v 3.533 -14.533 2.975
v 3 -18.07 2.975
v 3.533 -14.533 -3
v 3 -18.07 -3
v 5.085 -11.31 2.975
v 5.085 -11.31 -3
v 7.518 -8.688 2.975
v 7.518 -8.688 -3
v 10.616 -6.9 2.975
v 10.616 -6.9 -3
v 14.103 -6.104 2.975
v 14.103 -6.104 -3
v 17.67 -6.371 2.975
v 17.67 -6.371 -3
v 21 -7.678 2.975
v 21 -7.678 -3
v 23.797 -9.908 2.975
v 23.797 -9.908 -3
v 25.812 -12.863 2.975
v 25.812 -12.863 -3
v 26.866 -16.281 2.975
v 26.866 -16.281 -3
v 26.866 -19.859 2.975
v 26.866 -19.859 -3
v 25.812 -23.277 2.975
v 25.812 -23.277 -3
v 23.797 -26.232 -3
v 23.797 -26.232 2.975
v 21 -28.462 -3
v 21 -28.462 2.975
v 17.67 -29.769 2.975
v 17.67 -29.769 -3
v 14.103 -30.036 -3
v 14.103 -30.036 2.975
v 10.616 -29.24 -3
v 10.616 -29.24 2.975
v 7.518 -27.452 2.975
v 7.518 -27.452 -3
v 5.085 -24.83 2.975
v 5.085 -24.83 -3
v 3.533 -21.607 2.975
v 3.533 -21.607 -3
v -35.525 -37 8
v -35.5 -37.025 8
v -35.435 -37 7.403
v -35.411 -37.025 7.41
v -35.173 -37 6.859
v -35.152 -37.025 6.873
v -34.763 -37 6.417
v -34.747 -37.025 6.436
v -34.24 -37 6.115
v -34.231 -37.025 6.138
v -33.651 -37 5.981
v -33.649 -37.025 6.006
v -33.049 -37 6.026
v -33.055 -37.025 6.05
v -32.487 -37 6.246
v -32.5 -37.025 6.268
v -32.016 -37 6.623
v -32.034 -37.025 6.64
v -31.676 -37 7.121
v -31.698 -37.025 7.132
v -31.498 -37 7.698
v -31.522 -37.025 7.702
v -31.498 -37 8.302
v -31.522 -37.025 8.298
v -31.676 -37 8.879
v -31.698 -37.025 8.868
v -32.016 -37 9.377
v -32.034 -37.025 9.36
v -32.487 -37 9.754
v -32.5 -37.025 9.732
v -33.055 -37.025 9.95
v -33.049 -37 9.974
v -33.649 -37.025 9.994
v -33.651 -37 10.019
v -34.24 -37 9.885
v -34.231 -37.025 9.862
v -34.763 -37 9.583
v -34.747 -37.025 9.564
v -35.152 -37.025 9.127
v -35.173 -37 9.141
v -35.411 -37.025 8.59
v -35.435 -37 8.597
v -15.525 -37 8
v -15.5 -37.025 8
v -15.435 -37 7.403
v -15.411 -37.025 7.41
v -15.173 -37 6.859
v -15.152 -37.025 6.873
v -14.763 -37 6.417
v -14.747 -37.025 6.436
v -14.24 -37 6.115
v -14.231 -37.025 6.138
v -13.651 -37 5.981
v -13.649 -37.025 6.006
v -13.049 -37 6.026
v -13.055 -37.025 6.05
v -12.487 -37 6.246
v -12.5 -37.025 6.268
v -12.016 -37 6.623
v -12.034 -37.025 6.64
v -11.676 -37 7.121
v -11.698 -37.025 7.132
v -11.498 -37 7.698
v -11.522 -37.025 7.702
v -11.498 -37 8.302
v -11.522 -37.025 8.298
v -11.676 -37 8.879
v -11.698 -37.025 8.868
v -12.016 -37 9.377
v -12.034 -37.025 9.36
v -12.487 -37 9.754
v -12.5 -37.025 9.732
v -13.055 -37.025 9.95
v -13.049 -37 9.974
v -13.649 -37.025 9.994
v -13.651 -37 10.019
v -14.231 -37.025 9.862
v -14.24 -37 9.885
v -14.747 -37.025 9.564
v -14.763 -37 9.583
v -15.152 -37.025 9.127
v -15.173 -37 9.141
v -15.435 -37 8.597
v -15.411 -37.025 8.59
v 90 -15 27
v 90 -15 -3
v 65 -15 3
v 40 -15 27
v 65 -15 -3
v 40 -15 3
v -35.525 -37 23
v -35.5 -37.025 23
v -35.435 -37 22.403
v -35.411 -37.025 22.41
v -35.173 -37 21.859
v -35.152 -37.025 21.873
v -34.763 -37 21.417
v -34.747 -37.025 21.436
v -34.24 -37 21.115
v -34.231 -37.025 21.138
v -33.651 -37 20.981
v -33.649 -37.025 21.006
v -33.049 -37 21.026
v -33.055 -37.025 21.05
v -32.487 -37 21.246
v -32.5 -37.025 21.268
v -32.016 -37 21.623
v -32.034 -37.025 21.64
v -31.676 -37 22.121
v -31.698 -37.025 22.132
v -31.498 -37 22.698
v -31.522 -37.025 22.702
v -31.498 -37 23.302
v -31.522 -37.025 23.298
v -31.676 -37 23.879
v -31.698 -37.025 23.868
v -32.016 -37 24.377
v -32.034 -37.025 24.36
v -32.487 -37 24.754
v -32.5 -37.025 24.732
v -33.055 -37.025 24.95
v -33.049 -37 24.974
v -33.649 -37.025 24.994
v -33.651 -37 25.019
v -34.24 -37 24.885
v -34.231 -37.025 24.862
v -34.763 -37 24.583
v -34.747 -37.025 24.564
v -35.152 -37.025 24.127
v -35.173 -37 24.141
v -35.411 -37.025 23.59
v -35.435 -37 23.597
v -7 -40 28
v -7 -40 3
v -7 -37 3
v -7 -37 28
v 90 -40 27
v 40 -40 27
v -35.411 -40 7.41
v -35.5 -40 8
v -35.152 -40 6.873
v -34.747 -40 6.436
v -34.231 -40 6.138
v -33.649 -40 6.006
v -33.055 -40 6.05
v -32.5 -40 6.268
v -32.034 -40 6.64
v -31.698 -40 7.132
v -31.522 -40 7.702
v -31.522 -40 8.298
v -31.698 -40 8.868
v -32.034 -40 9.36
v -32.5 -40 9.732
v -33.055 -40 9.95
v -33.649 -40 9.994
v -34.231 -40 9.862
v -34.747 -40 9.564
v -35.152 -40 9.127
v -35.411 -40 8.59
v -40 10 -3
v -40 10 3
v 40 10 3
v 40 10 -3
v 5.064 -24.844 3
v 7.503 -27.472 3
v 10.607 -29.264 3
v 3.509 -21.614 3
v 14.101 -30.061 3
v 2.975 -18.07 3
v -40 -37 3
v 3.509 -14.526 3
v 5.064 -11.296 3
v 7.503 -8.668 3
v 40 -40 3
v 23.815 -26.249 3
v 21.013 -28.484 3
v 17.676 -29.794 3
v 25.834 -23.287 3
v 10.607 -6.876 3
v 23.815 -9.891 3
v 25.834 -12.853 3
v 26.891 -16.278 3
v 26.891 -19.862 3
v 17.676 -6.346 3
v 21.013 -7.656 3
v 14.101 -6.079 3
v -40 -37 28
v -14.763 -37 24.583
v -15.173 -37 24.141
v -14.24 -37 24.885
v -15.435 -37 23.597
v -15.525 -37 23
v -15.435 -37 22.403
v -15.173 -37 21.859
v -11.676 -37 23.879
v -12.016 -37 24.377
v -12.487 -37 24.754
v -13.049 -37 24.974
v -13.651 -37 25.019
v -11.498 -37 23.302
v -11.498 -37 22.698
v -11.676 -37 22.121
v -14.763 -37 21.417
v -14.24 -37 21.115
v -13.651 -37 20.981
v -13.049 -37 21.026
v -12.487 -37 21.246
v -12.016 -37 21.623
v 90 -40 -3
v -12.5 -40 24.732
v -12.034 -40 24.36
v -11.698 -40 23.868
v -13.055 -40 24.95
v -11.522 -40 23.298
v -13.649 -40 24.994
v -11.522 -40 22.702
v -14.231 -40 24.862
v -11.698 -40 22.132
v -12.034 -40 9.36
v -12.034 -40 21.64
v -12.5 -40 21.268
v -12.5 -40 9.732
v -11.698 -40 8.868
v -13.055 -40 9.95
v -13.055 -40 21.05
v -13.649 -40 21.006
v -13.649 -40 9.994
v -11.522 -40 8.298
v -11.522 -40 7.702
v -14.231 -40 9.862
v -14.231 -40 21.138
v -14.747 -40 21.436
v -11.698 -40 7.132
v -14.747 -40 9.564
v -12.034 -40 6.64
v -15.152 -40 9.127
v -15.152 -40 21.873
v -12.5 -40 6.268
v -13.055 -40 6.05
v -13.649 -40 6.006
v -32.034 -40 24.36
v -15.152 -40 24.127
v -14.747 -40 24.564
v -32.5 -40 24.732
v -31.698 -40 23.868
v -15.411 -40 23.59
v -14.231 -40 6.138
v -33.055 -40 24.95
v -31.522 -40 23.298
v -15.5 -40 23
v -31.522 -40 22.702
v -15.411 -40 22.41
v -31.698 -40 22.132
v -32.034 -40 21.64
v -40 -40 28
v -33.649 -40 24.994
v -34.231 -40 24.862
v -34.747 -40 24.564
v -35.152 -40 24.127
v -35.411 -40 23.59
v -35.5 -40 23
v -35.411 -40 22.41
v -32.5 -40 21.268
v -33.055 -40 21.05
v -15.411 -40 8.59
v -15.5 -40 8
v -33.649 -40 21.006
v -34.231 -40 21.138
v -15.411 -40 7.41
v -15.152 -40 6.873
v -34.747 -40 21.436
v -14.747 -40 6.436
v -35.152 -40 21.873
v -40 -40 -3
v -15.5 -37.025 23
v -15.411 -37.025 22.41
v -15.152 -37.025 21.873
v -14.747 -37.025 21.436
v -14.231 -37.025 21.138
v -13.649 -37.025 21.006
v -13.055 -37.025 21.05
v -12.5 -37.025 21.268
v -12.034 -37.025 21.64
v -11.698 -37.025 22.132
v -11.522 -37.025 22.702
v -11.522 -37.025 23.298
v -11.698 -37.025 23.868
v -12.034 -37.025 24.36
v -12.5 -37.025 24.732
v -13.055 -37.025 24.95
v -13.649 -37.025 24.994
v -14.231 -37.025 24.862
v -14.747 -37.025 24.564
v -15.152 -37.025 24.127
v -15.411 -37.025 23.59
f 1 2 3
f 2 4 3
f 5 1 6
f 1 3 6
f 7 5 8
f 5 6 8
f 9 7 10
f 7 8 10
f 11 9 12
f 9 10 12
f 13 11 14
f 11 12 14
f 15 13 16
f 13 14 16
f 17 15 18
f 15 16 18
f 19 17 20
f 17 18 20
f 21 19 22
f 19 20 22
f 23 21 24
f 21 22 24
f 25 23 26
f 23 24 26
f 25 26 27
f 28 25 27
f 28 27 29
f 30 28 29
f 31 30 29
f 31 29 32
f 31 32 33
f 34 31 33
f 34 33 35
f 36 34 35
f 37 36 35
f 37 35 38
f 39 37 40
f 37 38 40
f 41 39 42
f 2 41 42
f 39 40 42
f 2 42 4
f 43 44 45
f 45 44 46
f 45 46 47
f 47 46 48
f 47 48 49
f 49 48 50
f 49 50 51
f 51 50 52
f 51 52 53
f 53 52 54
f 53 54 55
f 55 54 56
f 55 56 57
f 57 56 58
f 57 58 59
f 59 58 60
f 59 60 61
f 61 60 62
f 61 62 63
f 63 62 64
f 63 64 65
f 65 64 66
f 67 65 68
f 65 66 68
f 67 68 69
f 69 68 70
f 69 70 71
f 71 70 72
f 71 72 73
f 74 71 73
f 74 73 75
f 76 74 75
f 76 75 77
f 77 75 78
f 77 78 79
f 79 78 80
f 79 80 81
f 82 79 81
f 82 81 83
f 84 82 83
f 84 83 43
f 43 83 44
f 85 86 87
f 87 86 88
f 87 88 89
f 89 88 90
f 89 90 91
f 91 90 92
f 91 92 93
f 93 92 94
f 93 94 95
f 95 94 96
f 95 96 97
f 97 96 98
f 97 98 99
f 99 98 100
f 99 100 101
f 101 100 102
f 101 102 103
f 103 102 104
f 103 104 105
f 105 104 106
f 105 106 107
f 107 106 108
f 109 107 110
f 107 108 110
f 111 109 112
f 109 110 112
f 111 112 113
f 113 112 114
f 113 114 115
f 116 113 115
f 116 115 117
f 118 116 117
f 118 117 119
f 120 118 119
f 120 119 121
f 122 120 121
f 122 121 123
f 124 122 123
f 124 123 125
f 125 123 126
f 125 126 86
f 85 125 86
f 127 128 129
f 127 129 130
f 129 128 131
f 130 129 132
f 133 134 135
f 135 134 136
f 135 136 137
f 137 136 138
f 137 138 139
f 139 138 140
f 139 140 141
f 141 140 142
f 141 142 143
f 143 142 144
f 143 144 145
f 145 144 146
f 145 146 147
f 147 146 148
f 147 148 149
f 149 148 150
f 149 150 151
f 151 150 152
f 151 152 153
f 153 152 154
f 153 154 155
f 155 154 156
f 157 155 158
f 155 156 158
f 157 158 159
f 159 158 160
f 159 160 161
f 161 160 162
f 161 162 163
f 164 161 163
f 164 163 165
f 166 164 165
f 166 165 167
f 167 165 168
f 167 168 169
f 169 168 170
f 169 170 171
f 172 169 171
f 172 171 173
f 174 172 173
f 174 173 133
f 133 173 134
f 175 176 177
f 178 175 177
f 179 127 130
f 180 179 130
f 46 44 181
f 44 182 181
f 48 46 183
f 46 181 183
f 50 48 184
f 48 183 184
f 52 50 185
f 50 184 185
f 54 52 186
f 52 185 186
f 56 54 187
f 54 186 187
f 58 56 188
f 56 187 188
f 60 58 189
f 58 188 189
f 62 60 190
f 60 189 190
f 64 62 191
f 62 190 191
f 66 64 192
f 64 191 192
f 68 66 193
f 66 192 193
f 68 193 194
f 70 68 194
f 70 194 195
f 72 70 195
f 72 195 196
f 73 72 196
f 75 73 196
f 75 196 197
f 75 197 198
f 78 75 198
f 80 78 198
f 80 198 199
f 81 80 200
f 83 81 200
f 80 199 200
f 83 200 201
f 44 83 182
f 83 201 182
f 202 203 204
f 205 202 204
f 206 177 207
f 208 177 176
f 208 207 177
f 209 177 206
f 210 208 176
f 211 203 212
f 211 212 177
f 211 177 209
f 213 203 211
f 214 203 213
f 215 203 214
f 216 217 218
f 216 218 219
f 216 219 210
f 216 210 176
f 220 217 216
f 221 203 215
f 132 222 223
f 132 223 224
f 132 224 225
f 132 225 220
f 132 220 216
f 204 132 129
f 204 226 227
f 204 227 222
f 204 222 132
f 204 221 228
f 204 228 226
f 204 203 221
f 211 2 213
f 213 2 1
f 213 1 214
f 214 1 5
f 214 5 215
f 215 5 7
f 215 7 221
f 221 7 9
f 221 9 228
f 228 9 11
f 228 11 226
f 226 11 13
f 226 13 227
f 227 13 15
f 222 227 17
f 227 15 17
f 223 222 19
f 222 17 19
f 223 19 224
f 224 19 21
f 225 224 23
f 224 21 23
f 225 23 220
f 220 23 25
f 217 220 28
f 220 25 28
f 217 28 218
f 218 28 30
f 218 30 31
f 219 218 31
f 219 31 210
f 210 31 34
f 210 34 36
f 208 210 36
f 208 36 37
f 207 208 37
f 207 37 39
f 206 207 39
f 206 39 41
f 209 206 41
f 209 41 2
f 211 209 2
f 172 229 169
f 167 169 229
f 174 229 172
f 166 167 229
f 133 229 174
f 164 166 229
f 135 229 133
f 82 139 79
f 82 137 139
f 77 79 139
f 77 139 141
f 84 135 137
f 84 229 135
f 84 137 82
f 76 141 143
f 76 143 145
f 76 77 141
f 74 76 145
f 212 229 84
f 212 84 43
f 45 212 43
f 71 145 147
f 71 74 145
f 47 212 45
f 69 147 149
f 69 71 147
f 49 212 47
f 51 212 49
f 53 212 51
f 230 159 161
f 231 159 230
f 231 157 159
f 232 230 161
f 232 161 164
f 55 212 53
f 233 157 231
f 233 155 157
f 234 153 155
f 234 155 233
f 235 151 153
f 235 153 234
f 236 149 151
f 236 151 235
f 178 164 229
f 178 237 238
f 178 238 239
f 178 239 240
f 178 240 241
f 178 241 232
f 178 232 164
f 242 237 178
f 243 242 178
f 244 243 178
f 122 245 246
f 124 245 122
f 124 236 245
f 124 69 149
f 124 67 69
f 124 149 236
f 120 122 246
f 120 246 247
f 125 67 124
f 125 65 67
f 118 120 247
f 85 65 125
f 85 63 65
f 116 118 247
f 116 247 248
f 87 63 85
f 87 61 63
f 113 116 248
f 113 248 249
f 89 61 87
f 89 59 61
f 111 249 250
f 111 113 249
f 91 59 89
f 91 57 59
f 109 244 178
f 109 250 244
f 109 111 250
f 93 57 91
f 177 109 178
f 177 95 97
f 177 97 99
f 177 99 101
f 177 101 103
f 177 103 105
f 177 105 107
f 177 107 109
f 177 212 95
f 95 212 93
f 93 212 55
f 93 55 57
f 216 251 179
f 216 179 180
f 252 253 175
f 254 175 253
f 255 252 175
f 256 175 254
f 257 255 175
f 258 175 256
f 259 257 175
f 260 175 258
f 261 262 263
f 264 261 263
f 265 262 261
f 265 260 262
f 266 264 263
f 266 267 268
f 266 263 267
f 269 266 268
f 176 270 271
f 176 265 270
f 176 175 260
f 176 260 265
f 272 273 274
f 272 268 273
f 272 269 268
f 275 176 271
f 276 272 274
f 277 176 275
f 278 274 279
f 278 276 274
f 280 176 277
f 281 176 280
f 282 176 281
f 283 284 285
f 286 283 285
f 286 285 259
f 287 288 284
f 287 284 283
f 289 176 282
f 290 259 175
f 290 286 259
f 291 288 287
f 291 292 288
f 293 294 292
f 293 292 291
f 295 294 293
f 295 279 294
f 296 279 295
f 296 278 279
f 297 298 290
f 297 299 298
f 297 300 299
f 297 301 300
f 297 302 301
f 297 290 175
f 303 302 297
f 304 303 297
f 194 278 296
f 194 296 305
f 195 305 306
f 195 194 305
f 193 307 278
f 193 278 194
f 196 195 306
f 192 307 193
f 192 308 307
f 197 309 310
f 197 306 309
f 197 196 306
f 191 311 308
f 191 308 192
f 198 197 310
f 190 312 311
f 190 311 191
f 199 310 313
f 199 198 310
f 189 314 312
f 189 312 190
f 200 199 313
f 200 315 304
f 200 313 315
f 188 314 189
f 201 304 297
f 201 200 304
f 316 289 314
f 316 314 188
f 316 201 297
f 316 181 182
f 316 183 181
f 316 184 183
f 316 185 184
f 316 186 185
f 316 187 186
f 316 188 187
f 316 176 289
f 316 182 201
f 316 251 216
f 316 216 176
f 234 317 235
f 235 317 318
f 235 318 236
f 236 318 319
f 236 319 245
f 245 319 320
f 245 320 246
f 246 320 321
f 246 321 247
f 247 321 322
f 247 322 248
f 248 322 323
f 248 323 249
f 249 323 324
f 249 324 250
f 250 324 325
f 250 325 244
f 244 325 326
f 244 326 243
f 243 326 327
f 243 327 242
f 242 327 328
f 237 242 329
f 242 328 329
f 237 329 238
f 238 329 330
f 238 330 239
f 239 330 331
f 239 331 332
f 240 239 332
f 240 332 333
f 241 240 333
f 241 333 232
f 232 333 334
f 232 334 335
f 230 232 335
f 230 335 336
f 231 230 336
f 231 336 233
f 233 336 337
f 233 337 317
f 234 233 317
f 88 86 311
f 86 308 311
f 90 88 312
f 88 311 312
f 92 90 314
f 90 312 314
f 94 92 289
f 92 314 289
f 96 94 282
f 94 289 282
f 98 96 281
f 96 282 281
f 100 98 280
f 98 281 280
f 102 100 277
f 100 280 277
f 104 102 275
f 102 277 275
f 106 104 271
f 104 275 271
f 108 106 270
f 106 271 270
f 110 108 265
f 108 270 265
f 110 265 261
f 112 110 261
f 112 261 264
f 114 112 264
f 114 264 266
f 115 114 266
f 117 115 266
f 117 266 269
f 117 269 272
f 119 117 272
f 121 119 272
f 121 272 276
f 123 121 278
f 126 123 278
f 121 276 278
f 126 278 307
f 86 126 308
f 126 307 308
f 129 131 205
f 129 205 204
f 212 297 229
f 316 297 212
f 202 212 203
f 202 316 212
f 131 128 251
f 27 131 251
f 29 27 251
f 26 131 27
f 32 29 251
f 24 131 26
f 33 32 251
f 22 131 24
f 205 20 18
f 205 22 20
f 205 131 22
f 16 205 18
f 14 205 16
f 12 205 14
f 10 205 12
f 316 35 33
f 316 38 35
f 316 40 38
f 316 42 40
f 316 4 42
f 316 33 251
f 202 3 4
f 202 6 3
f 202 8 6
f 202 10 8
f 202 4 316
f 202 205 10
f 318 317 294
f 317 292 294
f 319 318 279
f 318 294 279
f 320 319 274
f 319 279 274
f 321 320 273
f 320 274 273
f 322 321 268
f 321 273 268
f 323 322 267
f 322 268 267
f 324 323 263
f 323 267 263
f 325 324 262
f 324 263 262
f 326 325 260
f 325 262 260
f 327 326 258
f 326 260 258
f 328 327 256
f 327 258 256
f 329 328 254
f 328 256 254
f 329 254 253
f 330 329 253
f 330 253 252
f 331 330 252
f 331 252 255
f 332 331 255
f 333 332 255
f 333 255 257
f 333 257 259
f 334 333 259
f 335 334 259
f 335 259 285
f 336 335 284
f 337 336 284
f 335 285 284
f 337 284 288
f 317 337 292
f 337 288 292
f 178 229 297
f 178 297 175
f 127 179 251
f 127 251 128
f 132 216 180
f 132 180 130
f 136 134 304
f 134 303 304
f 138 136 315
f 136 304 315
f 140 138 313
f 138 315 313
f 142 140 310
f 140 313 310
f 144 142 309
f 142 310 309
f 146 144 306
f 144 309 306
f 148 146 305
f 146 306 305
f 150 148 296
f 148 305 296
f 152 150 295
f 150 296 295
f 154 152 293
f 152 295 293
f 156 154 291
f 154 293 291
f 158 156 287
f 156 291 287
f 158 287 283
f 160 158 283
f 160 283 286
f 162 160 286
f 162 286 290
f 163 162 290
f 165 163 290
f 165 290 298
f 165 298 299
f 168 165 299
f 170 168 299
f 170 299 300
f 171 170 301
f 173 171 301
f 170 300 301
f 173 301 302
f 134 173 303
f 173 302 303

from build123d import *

# Parameters (mm, degrees)
SKETCH1_W                            = 80
SKETCH1_H                            = 80
BOSS_EXTRUDE1_DEPTH                  = 3
SKETCH2_W                            = 33
SKETCH2_H                            = 3
BOSS_EXTRUDE2_DEPTH                  = 25
F_4_0_4_DIAMETER_HOLE1_D             = 4
F_4_0_4_DIAMETER_HOLE1_DEPTH         = 8
F_4_0_4_DIAMETER_HOLE1_CSINK_D       = 4.05
F_4_0_4_DIAMETER_HOLE1_CSINK_ANGLE   = 90
F_4_0_4_DIAMETER_HOLE1_TIP           = 1.201721238
F_24_0_24_DIAMETER_HOLE1_D           = 24
F_24_0_24_DIAMETER_HOLE1_DEPTH       = 8
F_24_0_24_DIAMETER_HOLE1_CSINK_D     = 24.05
F_24_0_24_DIAMETER_HOLE1_CSINK_ANGLE = 90
F_24_0_24_DIAMETER_HOLE1_TIP         = 7.210327428
SKETCH9_W                            = 80
SKETCH9_H                            = 30
CUT_EXTRUDE1_DEPTH                   = 15
SKETCH10_W                           = 50
SKETCH10_H                           = 25
BOSS_EXTRUDE4_DEPTH                  = 30
CHAMFER2_SIZE                        = 25


with BuildPart() as part:
    # Sketch1 → Boss-Extrude1 (new, symmetric)
    with BuildSketch(Plane.XY):
        Rectangle(SKETCH1_W, SKETCH1_H)
    extrude(amount=BOSS_EXTRUDE1_DEPTH, both=True)

    # Sketch2 → Boss-Extrude2 (add)
    with BuildSketch(Plane.XY.offset(3)):
        with Locations((-23.5, -38.5)):
            Rectangle(SKETCH2_W, SKETCH2_H)
    extrude(amount=BOSS_EXTRUDE2_DEPTH)

    # Ø4.0 (4) Diameter Hole1
    with Locations(Plane(origin=(0, -37, 0), x_dir=(1, 0, 0), z_dir=(0, 1, 0))):
        with Locations((-33.5, -8), (-13.5, -8), (-13.5, -23), (-33.5, -23)):
            CounterSinkHole(F_4_0_4_DIAMETER_HOLE1_D / 2, F_4_0_4_DIAMETER_HOLE1_CSINK_D / 2, depth=F_4_0_4_DIAMETER_HOLE1_DEPTH, counter_sink_angle=F_4_0_4_DIAMETER_HOLE1_CSINK_ANGLE)
            with Locations((0, 0, -(F_4_0_4_DIAMETER_HOLE1_DEPTH + F_4_0_4_DIAMETER_HOLE1_TIP / 2))):  # 118° drill point
                Cone(0, F_4_0_4_DIAMETER_HOLE1_D / 2, F_4_0_4_DIAMETER_HOLE1_TIP, mode=Mode.SUBTRACT)

    # Ø24.0 (24) Diameter Hole1
    with Locations(Plane.XY.offset(3)):
        with Locations((15, -18.07)):
            CounterSinkHole(F_24_0_24_DIAMETER_HOLE1_D / 2, F_24_0_24_DIAMETER_HOLE1_CSINK_D / 2, depth=F_24_0_24_DIAMETER_HOLE1_DEPTH, counter_sink_angle=F_24_0_24_DIAMETER_HOLE1_CSINK_ANGLE)
            with Locations((0, 0, -(F_24_0_24_DIAMETER_HOLE1_DEPTH + F_24_0_24_DIAMETER_HOLE1_TIP / 2))):  # 118° drill point
                Cone(0, F_24_0_24_DIAMETER_HOLE1_D / 2, F_24_0_24_DIAMETER_HOLE1_TIP, mode=Mode.SUBTRACT)

    # Sketch9 → Cut-Extrude1 (cut)
    with BuildSketch(Plane.XY.offset(3)):
        with Locations((0, 25)):
            Rectangle(SKETCH9_W, SKETCH9_H)
    extrude(amount=-CUT_EXTRUDE1_DEPTH, mode=Mode.SUBTRACT)

    # Sketch10 → Boss-Extrude4 (add)
    with BuildSketch(Plane(origin=(0, 0, -3), x_dir=(-1, 0, 0), z_dir=(0, 0, -1))):
        with Locations((-65, -27.5)):
            Rectangle(SKETCH10_W, SKETCH10_H)
    extrude(amount=-BOSS_EXTRUDE4_DEPTH)

    # Chamfer2
    chamfer2_edges = [part.edges().sort_by_distance(p)[0] for p in [
        (40, -15, 0),
    ]]
    chamfer(chamfer2_edges, length=CHAMFER2_SIZE - 0.0001)  # a hair under: the kernel refuses the full size


solid = part.part
